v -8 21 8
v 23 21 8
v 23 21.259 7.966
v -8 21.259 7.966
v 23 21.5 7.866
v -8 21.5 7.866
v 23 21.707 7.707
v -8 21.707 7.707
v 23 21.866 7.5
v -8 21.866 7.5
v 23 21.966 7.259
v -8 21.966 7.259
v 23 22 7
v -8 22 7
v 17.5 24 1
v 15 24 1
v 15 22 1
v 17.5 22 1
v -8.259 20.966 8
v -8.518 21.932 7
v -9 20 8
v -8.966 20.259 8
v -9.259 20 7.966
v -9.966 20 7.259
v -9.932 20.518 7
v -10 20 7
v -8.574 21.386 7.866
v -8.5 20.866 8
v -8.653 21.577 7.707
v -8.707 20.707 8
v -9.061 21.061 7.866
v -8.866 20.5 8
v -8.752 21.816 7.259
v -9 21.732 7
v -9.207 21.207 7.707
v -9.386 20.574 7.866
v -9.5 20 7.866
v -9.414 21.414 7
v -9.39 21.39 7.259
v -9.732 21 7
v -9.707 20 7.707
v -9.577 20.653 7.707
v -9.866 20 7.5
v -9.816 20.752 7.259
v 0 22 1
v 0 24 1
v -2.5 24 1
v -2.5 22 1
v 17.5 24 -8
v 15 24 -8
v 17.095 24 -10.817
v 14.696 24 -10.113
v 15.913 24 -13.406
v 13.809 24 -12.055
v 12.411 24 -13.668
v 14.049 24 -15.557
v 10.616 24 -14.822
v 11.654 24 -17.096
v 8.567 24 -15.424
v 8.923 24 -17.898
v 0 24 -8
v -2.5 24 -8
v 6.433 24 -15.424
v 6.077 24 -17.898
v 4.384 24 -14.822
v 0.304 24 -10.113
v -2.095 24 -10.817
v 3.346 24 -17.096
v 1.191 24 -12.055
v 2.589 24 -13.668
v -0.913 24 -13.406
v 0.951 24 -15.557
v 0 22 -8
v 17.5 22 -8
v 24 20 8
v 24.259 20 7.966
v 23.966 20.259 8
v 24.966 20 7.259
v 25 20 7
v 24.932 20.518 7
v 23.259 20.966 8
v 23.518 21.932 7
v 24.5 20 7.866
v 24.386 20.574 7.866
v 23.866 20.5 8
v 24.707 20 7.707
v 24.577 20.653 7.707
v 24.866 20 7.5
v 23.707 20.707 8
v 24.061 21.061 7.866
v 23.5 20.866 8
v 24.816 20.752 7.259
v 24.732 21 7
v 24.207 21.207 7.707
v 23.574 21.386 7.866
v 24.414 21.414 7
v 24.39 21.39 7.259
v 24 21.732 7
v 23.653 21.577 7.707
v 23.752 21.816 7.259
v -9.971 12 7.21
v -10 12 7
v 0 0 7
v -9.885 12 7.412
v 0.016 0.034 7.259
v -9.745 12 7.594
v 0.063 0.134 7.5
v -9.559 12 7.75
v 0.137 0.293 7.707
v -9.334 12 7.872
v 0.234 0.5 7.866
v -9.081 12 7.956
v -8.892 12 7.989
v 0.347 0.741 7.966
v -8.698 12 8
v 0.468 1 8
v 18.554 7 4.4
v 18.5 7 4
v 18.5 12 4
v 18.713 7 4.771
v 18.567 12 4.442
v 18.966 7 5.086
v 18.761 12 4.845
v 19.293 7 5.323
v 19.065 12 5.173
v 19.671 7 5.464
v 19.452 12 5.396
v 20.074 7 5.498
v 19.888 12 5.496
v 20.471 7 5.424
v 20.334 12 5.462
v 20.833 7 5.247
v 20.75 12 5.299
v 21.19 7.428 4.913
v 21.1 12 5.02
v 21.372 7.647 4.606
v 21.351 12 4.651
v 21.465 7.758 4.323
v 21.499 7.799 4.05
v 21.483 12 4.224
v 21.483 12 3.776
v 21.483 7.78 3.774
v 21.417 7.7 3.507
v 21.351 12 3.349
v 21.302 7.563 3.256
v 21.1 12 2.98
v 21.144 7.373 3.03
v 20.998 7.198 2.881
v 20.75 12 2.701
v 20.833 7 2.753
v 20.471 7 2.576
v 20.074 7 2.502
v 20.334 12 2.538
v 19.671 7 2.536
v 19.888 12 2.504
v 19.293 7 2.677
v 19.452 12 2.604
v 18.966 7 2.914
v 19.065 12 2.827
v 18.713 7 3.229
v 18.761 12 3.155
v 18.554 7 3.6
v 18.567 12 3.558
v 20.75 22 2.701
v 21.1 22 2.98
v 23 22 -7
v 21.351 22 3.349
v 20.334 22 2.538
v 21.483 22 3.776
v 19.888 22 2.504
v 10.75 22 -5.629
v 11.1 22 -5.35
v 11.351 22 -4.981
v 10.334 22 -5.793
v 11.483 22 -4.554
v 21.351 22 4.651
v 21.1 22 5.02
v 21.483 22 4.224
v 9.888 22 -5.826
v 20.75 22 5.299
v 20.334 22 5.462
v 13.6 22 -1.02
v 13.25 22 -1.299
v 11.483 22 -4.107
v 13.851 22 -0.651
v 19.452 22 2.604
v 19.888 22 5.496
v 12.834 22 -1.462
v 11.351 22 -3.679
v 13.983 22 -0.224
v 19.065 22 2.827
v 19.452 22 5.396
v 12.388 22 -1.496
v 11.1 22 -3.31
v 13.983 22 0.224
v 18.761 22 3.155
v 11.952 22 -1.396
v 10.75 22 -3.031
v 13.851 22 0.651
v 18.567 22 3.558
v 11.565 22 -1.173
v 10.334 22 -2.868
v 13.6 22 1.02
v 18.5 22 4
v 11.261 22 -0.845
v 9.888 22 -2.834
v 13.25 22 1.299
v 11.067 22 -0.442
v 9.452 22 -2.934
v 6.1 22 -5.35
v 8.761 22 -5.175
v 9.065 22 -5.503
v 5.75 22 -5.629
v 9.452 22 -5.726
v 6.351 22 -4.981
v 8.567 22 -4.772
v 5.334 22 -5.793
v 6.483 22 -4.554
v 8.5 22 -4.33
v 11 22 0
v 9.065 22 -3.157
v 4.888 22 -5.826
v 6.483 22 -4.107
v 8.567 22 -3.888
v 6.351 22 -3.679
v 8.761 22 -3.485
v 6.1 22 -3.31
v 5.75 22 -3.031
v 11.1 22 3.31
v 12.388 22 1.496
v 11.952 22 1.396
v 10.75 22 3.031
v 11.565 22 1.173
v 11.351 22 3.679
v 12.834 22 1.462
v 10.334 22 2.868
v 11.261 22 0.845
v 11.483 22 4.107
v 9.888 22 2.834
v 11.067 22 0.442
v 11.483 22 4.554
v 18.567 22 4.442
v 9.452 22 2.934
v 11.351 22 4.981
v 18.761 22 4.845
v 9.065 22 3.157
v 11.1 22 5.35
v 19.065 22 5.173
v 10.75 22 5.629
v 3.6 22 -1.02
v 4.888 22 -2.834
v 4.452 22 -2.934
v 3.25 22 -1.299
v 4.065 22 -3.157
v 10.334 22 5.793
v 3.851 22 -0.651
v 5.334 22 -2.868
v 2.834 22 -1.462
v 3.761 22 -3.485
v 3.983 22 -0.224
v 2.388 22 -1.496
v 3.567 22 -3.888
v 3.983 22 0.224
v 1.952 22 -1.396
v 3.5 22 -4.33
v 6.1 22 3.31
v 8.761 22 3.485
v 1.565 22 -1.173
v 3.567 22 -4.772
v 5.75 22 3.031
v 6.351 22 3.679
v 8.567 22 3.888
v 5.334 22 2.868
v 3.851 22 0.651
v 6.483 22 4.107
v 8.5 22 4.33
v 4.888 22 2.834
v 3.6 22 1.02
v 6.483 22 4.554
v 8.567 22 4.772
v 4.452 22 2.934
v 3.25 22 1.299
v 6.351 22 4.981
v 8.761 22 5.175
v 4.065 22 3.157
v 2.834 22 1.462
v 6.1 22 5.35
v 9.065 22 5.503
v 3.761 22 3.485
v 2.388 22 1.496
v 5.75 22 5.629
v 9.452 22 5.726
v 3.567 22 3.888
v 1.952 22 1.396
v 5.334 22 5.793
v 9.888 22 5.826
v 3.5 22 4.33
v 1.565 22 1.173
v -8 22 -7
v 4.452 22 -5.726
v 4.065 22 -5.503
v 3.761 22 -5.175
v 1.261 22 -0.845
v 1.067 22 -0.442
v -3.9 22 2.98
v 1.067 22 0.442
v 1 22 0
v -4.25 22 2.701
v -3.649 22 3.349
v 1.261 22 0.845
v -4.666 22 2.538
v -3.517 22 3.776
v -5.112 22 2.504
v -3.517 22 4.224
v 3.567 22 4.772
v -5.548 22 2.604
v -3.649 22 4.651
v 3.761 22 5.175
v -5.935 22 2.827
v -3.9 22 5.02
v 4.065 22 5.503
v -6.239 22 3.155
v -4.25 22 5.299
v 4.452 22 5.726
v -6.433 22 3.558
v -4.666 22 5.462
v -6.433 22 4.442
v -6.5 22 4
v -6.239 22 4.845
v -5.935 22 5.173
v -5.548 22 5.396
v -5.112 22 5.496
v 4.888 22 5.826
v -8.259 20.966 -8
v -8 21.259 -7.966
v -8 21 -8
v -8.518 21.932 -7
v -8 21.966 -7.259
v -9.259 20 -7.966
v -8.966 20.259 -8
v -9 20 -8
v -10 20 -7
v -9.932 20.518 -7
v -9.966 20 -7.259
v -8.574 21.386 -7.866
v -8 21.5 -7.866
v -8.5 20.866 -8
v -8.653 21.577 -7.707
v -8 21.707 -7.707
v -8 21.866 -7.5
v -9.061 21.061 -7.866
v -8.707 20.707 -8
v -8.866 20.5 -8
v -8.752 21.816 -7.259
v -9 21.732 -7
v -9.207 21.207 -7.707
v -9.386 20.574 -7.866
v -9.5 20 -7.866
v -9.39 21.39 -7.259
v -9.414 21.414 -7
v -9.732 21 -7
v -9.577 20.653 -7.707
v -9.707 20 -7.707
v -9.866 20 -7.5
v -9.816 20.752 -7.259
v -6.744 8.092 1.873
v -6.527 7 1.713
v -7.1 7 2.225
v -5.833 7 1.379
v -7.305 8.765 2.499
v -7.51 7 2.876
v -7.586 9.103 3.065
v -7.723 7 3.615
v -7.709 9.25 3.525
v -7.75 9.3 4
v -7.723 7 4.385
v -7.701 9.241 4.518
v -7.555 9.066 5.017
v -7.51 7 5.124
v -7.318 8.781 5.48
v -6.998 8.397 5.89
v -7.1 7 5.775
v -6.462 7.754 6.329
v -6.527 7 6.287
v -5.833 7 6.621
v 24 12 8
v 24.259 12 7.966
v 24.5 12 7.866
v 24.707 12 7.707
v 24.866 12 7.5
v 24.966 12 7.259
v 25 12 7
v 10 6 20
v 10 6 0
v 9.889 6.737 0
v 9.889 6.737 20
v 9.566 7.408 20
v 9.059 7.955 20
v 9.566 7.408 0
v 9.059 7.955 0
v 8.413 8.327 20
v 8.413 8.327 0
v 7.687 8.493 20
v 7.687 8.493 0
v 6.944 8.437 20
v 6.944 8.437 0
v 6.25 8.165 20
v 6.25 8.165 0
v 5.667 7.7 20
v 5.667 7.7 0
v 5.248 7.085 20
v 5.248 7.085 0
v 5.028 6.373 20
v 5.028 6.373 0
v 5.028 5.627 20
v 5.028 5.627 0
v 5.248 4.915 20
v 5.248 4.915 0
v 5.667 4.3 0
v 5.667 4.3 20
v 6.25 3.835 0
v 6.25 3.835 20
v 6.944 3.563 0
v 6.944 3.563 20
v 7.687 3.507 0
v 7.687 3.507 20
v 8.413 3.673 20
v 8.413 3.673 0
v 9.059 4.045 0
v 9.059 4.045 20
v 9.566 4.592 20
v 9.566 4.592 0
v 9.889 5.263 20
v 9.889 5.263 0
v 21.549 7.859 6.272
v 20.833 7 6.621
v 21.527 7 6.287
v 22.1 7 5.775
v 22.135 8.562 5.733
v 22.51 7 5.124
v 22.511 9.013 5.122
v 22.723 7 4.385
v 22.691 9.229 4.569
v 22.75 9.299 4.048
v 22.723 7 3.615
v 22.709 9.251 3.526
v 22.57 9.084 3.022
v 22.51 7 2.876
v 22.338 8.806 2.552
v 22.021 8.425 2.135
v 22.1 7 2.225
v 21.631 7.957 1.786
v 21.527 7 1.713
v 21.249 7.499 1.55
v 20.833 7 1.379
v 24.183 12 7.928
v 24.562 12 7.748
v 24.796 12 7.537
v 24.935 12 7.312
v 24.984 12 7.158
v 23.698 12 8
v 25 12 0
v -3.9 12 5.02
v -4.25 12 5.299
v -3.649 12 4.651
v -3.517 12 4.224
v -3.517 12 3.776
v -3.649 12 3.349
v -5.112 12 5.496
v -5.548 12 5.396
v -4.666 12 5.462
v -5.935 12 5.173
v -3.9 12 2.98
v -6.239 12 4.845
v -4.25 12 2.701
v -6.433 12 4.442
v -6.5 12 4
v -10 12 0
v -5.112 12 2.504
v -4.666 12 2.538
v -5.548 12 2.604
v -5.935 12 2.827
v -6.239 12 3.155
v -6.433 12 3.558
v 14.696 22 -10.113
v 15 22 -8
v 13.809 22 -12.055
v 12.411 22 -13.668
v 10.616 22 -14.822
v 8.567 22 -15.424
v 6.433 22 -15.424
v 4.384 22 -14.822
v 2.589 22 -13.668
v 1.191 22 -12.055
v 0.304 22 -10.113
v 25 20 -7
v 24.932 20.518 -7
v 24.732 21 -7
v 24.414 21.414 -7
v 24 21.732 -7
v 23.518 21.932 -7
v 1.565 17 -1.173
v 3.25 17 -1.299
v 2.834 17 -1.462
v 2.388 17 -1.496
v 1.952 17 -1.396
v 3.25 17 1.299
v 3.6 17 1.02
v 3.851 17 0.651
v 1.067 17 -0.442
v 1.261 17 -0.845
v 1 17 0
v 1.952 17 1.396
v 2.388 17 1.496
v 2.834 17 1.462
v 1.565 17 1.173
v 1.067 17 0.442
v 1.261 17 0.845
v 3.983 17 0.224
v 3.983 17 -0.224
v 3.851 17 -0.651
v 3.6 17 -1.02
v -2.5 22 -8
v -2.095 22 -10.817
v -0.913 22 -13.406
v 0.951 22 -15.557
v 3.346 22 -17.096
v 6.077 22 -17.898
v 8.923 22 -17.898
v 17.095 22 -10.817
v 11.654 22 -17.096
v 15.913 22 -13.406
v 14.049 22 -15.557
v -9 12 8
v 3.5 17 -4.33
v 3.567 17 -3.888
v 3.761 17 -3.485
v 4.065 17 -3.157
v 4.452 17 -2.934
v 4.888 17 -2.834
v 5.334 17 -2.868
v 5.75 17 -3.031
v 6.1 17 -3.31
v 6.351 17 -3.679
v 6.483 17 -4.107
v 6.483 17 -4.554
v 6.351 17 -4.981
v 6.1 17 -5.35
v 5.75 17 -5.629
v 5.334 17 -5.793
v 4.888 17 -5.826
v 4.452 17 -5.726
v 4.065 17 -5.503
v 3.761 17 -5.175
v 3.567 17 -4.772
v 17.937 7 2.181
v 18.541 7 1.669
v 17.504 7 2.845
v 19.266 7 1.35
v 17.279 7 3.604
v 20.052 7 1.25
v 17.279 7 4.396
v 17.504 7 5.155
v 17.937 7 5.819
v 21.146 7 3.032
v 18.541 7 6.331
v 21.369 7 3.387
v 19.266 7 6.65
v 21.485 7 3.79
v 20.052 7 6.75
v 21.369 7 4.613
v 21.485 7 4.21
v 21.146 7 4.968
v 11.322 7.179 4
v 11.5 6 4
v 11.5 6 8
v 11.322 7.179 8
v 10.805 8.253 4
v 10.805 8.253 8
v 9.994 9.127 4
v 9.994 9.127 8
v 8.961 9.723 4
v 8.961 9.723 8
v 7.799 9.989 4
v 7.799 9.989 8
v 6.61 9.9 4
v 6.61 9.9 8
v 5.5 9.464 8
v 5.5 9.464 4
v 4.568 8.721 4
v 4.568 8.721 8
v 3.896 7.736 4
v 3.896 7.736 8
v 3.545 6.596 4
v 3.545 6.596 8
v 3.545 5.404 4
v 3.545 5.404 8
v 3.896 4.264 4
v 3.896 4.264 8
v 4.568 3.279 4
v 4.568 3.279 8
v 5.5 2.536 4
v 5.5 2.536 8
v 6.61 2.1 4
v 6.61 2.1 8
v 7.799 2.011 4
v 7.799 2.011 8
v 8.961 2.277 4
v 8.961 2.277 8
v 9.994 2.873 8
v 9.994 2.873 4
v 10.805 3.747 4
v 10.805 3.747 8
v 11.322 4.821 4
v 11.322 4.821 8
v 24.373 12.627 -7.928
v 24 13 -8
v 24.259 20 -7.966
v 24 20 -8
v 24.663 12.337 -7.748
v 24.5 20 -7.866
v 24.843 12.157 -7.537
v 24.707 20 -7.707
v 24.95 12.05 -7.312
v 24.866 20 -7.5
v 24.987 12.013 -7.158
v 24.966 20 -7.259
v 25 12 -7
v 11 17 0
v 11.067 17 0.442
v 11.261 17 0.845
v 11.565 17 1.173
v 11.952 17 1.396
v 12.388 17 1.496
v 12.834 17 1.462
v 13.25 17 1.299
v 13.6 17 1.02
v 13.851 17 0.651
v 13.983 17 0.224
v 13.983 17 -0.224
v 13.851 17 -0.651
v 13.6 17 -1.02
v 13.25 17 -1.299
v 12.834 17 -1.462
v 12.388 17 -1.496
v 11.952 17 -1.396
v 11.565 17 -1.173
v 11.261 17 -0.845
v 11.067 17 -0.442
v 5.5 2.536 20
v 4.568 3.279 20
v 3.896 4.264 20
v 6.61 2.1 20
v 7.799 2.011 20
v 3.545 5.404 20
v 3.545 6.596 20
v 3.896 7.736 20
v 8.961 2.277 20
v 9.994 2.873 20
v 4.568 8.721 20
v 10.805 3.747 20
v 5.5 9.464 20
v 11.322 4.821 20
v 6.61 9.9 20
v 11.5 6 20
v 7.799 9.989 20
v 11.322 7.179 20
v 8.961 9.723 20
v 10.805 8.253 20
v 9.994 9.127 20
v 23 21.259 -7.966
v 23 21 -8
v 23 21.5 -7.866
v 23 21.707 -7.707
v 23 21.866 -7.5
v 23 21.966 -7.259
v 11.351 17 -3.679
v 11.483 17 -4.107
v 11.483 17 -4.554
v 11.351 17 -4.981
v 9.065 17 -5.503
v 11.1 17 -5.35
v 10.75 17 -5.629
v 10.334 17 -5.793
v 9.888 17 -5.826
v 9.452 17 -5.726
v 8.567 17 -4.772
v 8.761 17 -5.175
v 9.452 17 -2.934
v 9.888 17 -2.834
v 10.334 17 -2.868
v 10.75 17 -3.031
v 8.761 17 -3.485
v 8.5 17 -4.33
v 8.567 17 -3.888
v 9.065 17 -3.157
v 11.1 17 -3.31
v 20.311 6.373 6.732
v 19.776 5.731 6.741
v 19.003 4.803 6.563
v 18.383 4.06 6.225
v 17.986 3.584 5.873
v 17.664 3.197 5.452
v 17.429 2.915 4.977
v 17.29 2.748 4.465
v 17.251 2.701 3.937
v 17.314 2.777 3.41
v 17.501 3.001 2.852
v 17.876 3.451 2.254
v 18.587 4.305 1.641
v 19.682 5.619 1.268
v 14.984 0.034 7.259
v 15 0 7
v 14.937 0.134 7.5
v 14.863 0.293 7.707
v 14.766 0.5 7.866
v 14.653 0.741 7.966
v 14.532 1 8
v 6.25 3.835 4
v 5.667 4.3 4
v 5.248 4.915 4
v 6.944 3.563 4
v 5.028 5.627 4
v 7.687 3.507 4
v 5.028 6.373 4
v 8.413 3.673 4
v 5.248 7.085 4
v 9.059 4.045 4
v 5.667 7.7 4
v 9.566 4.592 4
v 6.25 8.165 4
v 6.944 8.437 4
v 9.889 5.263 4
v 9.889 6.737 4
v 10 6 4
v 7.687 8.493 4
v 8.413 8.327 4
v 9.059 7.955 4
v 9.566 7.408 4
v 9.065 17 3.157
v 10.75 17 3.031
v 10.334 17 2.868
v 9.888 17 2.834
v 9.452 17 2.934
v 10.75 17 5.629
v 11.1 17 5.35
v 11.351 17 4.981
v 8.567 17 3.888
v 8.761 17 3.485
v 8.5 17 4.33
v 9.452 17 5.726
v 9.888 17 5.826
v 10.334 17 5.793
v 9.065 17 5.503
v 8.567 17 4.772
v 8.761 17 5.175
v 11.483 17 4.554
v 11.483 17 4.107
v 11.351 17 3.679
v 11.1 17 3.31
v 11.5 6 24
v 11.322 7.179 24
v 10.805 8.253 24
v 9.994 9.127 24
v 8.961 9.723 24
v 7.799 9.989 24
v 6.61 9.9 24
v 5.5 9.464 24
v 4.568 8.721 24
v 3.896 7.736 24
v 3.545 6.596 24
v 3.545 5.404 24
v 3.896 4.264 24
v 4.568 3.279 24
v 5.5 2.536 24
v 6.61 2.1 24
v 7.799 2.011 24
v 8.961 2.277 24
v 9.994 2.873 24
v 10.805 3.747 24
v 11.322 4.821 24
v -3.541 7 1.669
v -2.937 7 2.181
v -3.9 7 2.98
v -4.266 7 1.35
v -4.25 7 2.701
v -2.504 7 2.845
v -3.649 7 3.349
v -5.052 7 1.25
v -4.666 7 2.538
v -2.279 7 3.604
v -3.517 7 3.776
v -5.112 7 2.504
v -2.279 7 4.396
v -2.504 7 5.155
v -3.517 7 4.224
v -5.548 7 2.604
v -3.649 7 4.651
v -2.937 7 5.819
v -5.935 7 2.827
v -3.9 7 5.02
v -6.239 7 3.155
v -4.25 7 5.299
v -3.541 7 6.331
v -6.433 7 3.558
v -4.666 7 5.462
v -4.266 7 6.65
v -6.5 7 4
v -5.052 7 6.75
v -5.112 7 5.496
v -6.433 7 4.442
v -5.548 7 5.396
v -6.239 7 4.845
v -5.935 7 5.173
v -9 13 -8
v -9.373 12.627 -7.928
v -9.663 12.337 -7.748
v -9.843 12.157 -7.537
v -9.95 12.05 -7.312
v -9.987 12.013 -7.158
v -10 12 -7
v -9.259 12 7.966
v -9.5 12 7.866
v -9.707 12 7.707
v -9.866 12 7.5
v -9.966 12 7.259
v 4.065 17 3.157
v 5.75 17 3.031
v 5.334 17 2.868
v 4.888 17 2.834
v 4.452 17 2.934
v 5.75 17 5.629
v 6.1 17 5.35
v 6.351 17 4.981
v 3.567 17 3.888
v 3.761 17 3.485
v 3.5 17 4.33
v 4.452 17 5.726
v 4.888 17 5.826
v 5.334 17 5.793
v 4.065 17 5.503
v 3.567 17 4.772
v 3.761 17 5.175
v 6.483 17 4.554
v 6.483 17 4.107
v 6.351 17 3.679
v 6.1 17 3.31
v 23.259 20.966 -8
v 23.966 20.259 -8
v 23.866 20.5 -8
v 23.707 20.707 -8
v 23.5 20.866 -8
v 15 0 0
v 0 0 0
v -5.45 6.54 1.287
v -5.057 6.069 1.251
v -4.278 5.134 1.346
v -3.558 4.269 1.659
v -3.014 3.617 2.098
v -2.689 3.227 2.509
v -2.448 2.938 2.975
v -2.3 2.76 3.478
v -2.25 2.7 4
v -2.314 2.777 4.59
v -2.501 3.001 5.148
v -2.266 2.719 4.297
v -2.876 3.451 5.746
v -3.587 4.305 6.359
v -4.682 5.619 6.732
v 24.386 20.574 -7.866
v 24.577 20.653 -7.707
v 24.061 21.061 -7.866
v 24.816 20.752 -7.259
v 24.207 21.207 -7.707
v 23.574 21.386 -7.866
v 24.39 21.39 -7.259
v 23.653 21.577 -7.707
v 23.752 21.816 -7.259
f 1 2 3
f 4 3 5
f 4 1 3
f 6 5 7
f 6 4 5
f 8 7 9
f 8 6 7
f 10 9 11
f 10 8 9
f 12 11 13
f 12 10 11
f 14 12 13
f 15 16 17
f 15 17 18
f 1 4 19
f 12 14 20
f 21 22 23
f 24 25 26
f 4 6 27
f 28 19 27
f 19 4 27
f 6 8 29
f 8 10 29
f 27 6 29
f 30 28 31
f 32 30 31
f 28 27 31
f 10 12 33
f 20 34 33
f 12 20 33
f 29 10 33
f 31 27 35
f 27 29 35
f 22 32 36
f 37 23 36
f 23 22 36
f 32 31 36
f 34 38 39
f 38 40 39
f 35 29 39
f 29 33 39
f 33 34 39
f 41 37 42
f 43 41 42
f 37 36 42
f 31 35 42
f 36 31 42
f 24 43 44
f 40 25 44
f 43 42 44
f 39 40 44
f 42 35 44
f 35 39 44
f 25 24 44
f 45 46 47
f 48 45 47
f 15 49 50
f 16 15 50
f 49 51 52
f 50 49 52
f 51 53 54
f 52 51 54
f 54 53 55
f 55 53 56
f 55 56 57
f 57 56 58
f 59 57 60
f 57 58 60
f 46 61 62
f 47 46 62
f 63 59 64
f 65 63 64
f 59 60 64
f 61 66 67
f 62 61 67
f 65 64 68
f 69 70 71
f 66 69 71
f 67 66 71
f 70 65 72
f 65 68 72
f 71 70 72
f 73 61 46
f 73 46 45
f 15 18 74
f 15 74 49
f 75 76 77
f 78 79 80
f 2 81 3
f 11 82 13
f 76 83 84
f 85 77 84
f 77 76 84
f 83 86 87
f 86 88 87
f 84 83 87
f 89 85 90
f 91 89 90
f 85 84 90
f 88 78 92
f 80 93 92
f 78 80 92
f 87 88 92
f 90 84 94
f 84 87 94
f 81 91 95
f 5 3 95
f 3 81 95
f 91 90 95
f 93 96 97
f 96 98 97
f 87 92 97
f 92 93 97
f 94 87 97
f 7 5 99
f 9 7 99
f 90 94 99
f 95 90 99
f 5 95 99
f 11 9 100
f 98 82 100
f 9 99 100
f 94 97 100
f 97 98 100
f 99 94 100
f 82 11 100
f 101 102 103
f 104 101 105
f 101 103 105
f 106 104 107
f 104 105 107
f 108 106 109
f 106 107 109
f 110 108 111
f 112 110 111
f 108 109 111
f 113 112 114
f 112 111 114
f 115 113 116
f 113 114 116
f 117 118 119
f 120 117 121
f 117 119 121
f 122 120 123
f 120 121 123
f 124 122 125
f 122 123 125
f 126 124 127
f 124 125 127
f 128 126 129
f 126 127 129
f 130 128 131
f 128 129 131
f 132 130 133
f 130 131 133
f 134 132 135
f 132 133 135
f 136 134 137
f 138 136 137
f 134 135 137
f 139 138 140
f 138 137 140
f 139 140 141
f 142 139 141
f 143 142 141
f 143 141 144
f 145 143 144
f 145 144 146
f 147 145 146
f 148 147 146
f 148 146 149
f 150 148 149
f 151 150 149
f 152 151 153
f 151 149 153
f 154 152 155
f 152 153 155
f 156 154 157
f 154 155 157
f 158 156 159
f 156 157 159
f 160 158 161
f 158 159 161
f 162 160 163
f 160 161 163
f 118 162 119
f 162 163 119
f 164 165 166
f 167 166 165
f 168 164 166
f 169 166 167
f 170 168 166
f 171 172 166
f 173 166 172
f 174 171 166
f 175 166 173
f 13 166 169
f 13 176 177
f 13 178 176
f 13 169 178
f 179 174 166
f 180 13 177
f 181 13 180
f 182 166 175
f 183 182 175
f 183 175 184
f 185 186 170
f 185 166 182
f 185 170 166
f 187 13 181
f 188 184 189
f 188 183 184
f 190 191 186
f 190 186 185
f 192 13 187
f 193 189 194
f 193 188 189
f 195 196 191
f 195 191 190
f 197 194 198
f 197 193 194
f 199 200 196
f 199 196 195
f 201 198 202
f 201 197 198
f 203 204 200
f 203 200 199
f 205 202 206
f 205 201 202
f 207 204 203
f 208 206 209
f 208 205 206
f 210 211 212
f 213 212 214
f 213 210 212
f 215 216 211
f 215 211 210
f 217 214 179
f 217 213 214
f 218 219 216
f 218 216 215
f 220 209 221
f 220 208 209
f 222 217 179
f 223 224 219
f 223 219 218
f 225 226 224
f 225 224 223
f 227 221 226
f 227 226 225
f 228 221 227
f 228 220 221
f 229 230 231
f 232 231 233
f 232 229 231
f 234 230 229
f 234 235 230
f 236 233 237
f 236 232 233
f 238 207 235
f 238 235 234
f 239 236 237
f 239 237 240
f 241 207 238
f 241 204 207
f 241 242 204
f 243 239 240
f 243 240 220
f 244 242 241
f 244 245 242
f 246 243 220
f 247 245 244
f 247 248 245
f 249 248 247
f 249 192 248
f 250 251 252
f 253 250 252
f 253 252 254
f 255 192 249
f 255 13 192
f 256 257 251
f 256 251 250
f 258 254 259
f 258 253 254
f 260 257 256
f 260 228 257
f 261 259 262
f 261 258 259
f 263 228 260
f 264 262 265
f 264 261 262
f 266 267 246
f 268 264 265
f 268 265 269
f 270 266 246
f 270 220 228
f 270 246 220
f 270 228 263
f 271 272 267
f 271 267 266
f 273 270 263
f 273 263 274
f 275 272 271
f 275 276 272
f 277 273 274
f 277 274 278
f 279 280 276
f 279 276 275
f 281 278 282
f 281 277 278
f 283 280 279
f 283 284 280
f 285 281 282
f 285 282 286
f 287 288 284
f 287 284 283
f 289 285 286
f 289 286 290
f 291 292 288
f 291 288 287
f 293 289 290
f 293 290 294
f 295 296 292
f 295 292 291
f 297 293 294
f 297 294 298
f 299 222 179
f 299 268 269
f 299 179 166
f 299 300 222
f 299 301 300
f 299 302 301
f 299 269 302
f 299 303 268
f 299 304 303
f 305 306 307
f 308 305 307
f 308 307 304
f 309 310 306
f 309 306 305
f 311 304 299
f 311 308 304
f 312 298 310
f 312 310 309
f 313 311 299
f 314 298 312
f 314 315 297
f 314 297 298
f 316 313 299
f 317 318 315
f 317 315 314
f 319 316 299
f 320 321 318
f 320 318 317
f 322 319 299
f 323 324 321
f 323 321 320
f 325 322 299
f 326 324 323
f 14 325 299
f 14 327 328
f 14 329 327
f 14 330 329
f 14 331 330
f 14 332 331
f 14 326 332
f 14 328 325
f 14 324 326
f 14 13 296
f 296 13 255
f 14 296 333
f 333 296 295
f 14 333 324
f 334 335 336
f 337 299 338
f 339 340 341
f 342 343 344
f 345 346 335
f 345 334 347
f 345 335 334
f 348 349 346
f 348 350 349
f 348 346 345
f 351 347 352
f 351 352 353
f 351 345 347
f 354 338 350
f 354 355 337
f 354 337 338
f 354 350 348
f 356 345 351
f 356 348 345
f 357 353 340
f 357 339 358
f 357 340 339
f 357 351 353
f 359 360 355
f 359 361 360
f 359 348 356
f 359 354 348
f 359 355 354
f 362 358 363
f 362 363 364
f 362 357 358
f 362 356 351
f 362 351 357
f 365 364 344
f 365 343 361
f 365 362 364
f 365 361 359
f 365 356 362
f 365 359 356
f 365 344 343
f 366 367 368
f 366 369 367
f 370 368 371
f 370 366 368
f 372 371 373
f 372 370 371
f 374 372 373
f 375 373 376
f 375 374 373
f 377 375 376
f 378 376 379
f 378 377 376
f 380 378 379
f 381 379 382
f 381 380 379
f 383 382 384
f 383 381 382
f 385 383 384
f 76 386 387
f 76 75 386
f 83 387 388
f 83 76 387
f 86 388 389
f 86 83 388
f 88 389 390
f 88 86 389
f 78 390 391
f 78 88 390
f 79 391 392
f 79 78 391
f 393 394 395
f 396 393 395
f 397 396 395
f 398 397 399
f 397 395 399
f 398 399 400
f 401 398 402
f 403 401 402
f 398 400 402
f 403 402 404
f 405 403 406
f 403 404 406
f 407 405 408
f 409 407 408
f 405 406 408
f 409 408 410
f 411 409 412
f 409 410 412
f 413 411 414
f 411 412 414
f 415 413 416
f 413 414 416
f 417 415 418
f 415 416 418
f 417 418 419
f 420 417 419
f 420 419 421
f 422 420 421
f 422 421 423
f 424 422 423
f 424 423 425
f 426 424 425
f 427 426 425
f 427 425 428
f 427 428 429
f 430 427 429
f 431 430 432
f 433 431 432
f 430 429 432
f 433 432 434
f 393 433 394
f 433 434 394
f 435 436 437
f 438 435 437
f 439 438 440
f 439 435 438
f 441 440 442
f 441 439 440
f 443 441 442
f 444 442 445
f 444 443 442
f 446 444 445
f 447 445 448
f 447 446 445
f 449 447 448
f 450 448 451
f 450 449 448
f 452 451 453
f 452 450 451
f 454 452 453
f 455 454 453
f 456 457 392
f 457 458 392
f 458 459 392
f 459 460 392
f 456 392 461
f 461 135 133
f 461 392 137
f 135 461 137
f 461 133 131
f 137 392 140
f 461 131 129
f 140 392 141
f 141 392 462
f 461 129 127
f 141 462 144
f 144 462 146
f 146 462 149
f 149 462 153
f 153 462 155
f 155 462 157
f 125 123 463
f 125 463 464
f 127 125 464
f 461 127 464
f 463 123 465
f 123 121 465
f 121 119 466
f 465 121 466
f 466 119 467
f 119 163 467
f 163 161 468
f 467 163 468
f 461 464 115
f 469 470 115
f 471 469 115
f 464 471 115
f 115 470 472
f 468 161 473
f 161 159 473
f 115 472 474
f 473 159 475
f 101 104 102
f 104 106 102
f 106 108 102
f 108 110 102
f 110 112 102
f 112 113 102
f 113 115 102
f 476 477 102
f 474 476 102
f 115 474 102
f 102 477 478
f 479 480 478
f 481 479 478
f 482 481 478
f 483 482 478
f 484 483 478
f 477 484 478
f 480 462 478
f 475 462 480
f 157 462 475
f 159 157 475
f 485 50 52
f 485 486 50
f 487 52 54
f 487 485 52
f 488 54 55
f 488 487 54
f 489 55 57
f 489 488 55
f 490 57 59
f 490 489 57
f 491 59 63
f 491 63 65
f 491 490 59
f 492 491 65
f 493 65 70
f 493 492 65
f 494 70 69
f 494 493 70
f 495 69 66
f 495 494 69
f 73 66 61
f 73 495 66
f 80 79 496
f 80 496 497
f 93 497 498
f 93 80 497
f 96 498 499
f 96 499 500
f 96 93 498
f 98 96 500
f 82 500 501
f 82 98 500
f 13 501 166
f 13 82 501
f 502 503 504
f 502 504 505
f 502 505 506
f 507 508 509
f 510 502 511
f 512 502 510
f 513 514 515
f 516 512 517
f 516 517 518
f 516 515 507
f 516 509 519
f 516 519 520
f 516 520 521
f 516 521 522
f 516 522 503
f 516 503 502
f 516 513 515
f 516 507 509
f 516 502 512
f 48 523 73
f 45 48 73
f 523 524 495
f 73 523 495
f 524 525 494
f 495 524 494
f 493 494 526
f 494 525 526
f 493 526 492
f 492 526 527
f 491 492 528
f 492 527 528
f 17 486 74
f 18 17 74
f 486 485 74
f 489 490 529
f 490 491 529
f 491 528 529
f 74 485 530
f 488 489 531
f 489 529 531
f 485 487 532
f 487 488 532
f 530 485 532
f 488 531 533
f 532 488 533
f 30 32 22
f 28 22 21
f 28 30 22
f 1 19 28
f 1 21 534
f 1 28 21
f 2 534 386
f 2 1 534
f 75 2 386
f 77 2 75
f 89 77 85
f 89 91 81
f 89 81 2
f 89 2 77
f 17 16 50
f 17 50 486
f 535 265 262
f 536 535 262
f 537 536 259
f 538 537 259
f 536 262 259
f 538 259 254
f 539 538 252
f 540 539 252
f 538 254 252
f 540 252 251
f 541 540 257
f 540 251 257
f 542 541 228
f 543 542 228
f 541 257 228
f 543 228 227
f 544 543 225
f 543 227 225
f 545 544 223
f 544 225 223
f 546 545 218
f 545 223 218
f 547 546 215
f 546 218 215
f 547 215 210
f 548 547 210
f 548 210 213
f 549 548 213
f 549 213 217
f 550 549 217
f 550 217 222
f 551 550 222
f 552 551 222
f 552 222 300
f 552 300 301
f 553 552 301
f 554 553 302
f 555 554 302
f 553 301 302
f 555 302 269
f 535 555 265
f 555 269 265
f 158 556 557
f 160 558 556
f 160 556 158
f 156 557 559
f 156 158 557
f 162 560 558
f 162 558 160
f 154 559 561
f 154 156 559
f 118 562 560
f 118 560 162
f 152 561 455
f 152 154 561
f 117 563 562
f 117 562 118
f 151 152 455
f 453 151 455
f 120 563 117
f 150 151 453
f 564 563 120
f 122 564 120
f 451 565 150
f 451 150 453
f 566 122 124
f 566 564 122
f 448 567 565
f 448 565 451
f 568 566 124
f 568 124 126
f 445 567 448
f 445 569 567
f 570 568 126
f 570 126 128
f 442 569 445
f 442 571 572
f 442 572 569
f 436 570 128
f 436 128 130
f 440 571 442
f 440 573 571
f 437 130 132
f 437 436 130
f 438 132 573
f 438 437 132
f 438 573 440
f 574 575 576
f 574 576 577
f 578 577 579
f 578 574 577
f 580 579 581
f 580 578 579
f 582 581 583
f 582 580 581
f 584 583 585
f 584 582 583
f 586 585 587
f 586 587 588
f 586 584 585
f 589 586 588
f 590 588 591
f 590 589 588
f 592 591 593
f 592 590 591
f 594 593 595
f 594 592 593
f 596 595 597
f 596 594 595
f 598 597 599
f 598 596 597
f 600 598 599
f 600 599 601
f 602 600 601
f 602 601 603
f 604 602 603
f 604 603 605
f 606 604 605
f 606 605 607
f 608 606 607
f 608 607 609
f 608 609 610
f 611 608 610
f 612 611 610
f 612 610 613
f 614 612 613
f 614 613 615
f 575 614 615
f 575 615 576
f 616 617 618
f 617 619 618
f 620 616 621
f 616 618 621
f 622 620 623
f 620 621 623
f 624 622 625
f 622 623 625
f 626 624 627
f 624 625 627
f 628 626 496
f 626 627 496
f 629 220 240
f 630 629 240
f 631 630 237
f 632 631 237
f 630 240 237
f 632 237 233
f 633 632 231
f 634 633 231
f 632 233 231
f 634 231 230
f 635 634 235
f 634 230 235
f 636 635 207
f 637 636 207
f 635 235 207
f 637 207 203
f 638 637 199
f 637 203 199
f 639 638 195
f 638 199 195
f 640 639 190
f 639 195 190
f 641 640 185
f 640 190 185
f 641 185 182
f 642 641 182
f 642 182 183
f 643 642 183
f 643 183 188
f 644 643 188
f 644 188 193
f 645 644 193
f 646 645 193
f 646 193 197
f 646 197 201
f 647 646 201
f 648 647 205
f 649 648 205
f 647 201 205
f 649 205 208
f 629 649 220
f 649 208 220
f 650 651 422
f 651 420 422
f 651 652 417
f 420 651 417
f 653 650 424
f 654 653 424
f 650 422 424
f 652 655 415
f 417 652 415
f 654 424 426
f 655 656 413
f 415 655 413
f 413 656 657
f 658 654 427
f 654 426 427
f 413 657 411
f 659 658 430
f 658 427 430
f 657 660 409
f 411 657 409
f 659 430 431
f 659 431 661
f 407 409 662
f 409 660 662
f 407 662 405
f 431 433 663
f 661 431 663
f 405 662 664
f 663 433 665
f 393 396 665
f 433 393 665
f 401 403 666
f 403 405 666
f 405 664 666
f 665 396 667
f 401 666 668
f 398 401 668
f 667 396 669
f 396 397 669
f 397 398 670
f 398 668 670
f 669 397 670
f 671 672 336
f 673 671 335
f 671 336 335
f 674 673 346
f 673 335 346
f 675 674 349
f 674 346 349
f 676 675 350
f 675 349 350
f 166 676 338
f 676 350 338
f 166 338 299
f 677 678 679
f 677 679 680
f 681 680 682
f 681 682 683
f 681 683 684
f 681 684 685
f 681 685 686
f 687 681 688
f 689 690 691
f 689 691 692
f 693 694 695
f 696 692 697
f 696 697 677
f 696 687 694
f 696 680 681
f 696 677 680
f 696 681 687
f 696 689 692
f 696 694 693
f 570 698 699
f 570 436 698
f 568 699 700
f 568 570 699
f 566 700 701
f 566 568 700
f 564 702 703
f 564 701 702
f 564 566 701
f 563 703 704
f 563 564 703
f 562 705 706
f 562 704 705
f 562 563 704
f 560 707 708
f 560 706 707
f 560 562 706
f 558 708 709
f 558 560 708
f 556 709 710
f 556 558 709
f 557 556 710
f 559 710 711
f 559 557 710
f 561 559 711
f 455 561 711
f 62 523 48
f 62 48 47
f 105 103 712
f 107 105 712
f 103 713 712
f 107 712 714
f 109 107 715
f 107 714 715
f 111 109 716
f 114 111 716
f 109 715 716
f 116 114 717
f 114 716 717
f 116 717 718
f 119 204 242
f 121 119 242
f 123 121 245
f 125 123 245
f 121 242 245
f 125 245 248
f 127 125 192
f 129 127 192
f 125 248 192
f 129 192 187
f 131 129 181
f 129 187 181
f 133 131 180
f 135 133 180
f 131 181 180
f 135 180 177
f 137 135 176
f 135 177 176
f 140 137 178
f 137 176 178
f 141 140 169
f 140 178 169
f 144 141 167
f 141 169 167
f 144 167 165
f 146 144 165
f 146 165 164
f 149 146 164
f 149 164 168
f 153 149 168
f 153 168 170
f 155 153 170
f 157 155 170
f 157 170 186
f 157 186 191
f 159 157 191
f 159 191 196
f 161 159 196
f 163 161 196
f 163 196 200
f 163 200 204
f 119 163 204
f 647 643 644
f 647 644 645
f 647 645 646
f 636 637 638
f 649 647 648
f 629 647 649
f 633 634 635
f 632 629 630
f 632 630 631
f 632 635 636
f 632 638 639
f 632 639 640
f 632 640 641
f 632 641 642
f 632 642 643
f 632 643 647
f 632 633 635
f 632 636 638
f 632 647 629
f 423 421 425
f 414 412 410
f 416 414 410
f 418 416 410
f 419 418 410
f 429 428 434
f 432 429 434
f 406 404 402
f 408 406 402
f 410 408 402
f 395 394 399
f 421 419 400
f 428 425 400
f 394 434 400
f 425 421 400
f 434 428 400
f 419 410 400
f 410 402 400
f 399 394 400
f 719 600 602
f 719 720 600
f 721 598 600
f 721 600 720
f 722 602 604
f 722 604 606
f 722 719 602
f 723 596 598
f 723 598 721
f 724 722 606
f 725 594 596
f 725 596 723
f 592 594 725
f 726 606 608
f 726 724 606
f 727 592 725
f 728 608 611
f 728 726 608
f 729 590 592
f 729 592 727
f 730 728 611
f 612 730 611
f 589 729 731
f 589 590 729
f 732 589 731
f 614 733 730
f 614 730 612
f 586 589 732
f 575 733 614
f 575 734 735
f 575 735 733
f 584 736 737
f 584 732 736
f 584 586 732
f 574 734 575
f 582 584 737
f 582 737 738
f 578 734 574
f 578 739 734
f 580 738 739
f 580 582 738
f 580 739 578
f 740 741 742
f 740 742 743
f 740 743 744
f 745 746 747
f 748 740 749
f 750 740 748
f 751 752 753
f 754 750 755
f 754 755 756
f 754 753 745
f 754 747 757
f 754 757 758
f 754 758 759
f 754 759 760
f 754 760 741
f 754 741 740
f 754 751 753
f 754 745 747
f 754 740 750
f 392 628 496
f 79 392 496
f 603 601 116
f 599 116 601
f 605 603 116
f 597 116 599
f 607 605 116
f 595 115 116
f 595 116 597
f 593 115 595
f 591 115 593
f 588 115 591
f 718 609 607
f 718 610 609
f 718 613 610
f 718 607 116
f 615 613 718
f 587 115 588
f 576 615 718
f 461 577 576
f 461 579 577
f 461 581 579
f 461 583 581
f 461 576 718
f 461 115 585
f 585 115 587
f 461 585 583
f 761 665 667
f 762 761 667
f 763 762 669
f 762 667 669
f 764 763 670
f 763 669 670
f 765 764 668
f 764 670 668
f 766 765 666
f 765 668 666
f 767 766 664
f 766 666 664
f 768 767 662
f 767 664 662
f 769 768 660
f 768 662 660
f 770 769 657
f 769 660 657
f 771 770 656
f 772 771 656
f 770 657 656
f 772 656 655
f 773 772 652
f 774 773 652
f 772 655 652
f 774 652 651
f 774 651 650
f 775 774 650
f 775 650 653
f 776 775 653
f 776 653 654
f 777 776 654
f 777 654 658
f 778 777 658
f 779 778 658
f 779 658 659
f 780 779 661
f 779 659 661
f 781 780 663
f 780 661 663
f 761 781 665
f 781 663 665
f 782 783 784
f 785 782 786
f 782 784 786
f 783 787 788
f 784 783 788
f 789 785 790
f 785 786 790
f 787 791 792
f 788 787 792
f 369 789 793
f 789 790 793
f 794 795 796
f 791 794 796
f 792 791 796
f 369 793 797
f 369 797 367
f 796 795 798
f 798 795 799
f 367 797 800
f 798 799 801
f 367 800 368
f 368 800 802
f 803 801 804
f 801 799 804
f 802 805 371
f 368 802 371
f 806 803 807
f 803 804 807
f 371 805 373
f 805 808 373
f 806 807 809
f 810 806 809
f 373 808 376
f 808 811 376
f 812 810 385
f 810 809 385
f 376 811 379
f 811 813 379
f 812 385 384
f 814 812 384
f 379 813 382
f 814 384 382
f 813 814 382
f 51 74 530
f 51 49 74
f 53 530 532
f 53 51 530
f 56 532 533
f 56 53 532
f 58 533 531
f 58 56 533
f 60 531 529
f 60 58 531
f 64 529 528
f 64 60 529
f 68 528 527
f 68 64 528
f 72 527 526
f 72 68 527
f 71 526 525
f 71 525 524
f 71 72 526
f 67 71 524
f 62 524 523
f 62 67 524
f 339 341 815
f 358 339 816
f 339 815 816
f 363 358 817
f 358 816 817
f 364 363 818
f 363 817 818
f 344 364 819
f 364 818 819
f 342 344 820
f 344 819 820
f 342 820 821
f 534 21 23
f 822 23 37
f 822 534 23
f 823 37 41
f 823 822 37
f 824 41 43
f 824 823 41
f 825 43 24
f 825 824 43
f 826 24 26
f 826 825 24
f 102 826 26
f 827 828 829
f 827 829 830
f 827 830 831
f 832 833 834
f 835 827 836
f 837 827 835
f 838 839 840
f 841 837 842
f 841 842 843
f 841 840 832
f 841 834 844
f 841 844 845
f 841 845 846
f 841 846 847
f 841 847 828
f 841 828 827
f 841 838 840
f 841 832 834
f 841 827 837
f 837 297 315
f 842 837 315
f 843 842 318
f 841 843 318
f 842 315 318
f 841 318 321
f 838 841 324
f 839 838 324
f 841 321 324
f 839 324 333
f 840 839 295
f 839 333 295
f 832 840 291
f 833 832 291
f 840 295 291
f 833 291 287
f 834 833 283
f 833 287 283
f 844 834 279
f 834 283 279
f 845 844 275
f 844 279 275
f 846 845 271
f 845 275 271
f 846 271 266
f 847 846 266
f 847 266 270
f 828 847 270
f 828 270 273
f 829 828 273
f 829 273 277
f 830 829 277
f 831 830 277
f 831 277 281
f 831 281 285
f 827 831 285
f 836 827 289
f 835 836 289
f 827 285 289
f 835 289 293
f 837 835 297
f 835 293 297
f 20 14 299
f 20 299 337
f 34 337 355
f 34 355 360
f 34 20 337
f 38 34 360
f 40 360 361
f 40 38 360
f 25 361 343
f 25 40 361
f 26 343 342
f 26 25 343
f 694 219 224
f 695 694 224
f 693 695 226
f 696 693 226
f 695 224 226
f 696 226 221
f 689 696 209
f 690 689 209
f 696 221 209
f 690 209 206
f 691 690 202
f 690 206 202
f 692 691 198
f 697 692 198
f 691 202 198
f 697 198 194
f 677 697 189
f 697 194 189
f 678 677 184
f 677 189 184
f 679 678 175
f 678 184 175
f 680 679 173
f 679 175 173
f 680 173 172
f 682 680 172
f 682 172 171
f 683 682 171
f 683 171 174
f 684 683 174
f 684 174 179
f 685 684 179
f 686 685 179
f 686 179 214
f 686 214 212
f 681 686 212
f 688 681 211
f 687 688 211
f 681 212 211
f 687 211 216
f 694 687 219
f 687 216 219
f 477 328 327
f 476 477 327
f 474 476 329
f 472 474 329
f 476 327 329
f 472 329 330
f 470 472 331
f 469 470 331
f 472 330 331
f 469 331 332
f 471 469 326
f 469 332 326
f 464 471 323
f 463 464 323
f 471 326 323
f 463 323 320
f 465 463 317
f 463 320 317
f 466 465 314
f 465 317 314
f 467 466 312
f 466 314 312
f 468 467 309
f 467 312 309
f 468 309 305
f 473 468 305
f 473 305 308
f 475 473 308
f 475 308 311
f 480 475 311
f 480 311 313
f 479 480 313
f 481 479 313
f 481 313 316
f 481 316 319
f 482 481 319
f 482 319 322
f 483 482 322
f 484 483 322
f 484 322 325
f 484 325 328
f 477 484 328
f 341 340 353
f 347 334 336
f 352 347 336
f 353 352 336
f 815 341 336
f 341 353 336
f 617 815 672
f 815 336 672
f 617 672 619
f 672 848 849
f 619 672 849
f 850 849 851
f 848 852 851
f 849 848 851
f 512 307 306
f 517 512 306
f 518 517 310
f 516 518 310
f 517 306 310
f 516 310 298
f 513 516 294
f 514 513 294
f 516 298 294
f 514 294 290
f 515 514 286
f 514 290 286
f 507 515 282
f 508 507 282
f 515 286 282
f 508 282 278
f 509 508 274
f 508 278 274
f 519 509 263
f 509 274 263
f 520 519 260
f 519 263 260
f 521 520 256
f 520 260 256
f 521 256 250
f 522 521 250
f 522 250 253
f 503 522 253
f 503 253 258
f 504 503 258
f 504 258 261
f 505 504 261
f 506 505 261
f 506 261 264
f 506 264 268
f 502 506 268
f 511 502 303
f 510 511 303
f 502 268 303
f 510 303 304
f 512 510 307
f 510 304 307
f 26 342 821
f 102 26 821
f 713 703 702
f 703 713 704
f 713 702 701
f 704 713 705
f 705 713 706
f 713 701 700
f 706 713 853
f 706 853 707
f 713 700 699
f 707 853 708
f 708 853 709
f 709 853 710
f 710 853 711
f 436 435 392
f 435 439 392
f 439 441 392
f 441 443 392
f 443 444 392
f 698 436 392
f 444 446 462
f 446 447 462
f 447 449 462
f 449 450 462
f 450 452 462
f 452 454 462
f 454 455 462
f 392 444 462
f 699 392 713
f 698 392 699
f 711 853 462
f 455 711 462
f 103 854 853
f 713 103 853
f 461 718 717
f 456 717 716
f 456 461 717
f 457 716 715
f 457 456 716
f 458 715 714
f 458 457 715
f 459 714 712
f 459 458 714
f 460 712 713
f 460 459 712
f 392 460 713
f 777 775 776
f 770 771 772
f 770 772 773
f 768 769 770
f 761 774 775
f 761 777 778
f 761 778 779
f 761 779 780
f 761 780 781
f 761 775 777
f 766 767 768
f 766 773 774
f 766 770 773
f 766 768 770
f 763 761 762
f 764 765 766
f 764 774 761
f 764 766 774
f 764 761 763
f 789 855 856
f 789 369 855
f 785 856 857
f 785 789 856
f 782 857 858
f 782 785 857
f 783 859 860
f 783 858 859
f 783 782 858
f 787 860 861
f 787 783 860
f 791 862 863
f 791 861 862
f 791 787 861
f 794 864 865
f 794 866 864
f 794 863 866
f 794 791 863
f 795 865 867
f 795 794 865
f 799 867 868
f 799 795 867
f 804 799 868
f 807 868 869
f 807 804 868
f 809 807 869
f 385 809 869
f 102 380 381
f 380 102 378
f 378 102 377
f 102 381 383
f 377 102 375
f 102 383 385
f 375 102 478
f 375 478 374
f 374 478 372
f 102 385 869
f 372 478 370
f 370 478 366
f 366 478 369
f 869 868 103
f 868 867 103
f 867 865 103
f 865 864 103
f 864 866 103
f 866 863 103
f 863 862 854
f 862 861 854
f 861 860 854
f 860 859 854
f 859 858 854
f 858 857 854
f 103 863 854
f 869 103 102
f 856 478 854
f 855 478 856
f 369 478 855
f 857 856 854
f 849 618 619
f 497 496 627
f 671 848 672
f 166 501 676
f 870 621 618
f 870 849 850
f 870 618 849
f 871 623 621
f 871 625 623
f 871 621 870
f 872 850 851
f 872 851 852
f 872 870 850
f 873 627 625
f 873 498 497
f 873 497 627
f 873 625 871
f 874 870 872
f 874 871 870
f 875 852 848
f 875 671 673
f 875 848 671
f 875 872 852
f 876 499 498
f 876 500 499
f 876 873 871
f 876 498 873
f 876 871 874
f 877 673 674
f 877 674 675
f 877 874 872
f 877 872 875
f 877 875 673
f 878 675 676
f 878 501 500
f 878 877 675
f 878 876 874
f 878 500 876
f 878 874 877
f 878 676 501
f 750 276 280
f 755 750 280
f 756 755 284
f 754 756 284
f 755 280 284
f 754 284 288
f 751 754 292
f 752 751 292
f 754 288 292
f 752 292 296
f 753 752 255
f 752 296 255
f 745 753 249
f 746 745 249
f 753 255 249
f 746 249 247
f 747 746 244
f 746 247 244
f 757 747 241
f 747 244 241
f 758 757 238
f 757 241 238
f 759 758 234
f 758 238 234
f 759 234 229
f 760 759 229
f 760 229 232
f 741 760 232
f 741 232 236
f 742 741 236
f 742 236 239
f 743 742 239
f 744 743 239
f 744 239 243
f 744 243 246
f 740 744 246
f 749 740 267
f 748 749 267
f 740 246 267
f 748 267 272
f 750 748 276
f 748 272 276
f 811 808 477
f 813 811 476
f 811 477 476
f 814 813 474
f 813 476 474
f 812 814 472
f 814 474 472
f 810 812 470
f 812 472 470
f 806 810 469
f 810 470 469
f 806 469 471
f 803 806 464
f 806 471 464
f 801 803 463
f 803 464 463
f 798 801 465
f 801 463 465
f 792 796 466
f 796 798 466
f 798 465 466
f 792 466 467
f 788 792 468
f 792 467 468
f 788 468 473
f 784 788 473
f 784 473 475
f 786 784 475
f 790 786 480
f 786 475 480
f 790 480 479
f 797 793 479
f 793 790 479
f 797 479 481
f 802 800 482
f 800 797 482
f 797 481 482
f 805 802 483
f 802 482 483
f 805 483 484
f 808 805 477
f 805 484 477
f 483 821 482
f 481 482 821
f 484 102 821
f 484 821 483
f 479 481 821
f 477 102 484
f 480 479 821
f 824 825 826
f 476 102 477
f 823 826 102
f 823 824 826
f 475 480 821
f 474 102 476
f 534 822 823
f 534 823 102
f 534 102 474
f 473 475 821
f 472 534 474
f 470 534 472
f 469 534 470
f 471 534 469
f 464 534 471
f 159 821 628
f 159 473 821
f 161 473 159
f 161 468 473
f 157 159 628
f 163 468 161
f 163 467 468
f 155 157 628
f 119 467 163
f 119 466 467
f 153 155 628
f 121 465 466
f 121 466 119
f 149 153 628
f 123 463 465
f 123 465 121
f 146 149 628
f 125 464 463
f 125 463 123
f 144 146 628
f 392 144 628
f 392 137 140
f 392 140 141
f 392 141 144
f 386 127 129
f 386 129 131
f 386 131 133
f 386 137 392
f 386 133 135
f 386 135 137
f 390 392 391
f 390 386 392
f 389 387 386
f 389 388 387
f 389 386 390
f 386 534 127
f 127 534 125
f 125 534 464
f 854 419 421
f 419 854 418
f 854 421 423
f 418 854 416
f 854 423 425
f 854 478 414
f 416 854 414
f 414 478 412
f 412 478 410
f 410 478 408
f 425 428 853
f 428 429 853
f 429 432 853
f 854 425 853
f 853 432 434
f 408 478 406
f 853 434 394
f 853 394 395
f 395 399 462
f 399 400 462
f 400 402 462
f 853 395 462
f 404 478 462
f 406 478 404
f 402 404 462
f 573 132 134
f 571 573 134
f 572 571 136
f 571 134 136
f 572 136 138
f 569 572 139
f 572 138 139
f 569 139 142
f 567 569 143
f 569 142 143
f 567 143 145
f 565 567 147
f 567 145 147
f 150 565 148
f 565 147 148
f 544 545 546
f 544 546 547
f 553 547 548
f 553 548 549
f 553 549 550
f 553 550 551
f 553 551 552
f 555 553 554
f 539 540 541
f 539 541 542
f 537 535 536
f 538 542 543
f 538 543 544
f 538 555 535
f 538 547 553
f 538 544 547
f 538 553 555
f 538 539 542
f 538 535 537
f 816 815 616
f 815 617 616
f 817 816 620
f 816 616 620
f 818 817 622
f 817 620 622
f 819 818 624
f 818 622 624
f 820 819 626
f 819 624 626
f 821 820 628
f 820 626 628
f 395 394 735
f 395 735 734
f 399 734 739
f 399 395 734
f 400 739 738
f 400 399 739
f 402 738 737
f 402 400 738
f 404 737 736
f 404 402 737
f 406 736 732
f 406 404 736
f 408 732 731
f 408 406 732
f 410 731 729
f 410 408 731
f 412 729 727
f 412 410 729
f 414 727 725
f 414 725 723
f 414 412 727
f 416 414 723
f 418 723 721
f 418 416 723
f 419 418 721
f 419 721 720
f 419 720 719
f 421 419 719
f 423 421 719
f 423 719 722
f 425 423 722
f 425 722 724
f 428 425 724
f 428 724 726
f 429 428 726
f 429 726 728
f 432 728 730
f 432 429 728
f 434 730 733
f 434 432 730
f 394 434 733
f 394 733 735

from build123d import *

# Parameters (mm, degrees)
F0_R      = 4
F1_DEPTH  = 8
F0_R_2    = 2.5
F2_DEPTH  = 4
F3_DEPTH  = 20
F4_R      = 4
F5_DEPTH  = 4
F6_R      = 1.5
F7_DEPTH  = 12.001
F6_R_2    = 2.75
F8_DEPTH  = 5
F9_R      = 2.75
F10_DEPTH = 7.001
F11_R     = 1
F12_DEPTH = 8
F13_R     = 1.5
F14_DEPTH = 22.001
F15_DEPTH = 5
F16_R     = 1
F17_E39_W = 2.5
F17_E39_H = 2


with BuildPart() as f1:
    # F0 (on Top) → F1 (new body)
    with BuildSketch(Plane.XY):
        Polygon((-10, 12), (0, 0), (15, 0), (25, 12), (15, 12), (0, 12), align=None)
        with Locations((7.5, 6)):
            Circle(F0_R, mode=Mode.SUBTRACT)
    extrude(amount=F1_DEPTH)

    # F0 (on Top) → F2 (join)
    with BuildSketch(Plane.XY):
        with Locations((7.5, 6)):
            Circle(F0_R)
        with Locations((7.5, 6)):
            Circle(F0_R_2, mode=Mode.SUBTRACT)
    extrude(amount=F2_DEPTH)

    # F6 (on face) → F7 (cut, through all)
    with BuildSketch(Plane(origin=(0, 12, 0), x_dir=(-1, 0, 0), z_dir=(0, 1, 0))):
        with Locations((-20, 4)):
            Circle(F6_R)
        with Locations((5, 4)):
            Circle(F6_R)
    extrude(amount=-F7_DEPTH, mode=Mode.SUBTRACT)

    # F6 (on face) → F8 (join)
    with BuildSketch(Plane(origin=(0, 12, 0), x_dir=(-1, 0, 0), z_dir=(0, 1, 0))):
        with Locations((-20, 4)):
            Circle(F6_R_2)
        with Locations((-20, 4)):
            Circle(F6_R, mode=Mode.SUBTRACT)
        with Locations((5, 4)):
            Circle(F6_R_2)
        with Locations((5, 4)):
            Circle(F6_R, mode=Mode.SUBTRACT)
    extrude(amount=-F8_DEPTH)

    # F9 (on face) → F10 (cut, through all)
    with BuildSketch(Plane.XZ.offset(-7)):
        with Locations((20, 4)):
            Circle(F9_R)
        with Locations((-5, 4)):
            Circle(F9_R)
    extrude(amount=F10_DEPTH, mode=Mode.SUBTRACT)

    # F11
    f11_edges = [f1.edges().sort_by_distance(p)[0] for p in [
        (-5, 6, 8),
        (7.5, 0, 8),
        (20, 6, 8),
    ]]
    fillet(f11_edges, radius=F11_R)


with BuildPart() as f3:
    # F0 (on Top) → F3 (new body)
    with BuildSketch(Plane.XY):
        with Locations((7.5, 6)):
            Circle(F0_R_2)
    extrude(amount=F3_DEPTH)

    # F4 (on face) → F5 (join)
    with BuildSketch(Plane.XY.offset(20)):
        with Locations((7.5, 6)):
            Circle(F4_R)
    extrude(amount=F5_DEPTH)


with BuildPart() as f12:
    # F0 (on Top) → F12 (new body, symmetric)
    with BuildSketch(Plane.XY):
        with BuildLine():
            Line((-10, 20), (-10, 12))
            Line((-10, 12), (0, 12))
            Line((0, 12), (15, 12))
            Line((15, 12), (25, 12))
            Line((25, 12), (25, 20))
            ThreePointArc((25, 20), (24.4142135624, 21.4142135624), (23, 22))
            Line((23, 22), (-8, 22))
            ThreePointArc((-8, 22), (-9.4142135624, 21.4142135624), (-10, 20))
        make_face()
    extrude(amount=F12_DEPTH, both=True)

    # F13 (on face) → F14 (cut, through all)
    with BuildSketch(Plane(origin=(0, 22, 0), x_dir=(-1, 0, 0), z_dir=(0, 1, 0))):
        with Locations((-20, 4)):
            Circle(F13_R)
        with Locations((5, 4)):
            Circle(F13_R)
    extrude(amount=-F14_DEPTH, mode=Mode.SUBTRACT)

    # F13 (on face) → F15 (cut)
    with BuildSketch(Plane(origin=(0, 22, 0), x_dir=(-1, 0, 0), z_dir=(0, 1, 0))):
        with Locations((-10, 4.3301270189)):
            Circle(F13_R)
        with Locations((-12.5, 0)):
            Circle(F13_R)
        with Locations((-5, 4.3301270189)):
            Circle(F13_R)
        with Locations((-10, -4.3301270189)):
            Circle(F13_R)
        with Locations((-5, -4.3301270189)):
            Circle(F13_R)
        with Locations((-2.5, 0)):
            Circle(F13_R)
    extrude(amount=-F15_DEPTH, mode=Mode.SUBTRACT)

    # F16
    f16_edges = [f12.edges().sort_by_distance(p)[0] for p in [
        (25, 16, 8),
        (25, 16, -8),
        (7.5, 12, -8),
    ]]
    fillet(f16_edges, radius=F16_R)


with BuildPart() as f18:
    # F18: sweep along a path in F13
    with BuildLine(Plane(origin=(0, 22, 0), x_dir=(-1, 0, 0), z_dir=(0, 1, 0))) as f18_path:
        Line((-16.25, 1), (-16.25, -8))
        ThreePointArc((-16.25, -8), (-7.5, -16.75), (1.25, -8))
        Line((1.25, -8), (1.25, 1))
    # F17_E39 (on explicit) → F18 (sweep)
    with BuildSketch(Plane(origin=(15, 22, 1), x_dir=(1, 0, 0), z_dir=(0, 0, 1))):
        with Locations((1.25, 1)):
            Rectangle(F17_E39_W, F17_E39_H)
    sweep(path=f18_path.line)


solid = Compound([f1.part, f3.part, f12.part, f18.part])
